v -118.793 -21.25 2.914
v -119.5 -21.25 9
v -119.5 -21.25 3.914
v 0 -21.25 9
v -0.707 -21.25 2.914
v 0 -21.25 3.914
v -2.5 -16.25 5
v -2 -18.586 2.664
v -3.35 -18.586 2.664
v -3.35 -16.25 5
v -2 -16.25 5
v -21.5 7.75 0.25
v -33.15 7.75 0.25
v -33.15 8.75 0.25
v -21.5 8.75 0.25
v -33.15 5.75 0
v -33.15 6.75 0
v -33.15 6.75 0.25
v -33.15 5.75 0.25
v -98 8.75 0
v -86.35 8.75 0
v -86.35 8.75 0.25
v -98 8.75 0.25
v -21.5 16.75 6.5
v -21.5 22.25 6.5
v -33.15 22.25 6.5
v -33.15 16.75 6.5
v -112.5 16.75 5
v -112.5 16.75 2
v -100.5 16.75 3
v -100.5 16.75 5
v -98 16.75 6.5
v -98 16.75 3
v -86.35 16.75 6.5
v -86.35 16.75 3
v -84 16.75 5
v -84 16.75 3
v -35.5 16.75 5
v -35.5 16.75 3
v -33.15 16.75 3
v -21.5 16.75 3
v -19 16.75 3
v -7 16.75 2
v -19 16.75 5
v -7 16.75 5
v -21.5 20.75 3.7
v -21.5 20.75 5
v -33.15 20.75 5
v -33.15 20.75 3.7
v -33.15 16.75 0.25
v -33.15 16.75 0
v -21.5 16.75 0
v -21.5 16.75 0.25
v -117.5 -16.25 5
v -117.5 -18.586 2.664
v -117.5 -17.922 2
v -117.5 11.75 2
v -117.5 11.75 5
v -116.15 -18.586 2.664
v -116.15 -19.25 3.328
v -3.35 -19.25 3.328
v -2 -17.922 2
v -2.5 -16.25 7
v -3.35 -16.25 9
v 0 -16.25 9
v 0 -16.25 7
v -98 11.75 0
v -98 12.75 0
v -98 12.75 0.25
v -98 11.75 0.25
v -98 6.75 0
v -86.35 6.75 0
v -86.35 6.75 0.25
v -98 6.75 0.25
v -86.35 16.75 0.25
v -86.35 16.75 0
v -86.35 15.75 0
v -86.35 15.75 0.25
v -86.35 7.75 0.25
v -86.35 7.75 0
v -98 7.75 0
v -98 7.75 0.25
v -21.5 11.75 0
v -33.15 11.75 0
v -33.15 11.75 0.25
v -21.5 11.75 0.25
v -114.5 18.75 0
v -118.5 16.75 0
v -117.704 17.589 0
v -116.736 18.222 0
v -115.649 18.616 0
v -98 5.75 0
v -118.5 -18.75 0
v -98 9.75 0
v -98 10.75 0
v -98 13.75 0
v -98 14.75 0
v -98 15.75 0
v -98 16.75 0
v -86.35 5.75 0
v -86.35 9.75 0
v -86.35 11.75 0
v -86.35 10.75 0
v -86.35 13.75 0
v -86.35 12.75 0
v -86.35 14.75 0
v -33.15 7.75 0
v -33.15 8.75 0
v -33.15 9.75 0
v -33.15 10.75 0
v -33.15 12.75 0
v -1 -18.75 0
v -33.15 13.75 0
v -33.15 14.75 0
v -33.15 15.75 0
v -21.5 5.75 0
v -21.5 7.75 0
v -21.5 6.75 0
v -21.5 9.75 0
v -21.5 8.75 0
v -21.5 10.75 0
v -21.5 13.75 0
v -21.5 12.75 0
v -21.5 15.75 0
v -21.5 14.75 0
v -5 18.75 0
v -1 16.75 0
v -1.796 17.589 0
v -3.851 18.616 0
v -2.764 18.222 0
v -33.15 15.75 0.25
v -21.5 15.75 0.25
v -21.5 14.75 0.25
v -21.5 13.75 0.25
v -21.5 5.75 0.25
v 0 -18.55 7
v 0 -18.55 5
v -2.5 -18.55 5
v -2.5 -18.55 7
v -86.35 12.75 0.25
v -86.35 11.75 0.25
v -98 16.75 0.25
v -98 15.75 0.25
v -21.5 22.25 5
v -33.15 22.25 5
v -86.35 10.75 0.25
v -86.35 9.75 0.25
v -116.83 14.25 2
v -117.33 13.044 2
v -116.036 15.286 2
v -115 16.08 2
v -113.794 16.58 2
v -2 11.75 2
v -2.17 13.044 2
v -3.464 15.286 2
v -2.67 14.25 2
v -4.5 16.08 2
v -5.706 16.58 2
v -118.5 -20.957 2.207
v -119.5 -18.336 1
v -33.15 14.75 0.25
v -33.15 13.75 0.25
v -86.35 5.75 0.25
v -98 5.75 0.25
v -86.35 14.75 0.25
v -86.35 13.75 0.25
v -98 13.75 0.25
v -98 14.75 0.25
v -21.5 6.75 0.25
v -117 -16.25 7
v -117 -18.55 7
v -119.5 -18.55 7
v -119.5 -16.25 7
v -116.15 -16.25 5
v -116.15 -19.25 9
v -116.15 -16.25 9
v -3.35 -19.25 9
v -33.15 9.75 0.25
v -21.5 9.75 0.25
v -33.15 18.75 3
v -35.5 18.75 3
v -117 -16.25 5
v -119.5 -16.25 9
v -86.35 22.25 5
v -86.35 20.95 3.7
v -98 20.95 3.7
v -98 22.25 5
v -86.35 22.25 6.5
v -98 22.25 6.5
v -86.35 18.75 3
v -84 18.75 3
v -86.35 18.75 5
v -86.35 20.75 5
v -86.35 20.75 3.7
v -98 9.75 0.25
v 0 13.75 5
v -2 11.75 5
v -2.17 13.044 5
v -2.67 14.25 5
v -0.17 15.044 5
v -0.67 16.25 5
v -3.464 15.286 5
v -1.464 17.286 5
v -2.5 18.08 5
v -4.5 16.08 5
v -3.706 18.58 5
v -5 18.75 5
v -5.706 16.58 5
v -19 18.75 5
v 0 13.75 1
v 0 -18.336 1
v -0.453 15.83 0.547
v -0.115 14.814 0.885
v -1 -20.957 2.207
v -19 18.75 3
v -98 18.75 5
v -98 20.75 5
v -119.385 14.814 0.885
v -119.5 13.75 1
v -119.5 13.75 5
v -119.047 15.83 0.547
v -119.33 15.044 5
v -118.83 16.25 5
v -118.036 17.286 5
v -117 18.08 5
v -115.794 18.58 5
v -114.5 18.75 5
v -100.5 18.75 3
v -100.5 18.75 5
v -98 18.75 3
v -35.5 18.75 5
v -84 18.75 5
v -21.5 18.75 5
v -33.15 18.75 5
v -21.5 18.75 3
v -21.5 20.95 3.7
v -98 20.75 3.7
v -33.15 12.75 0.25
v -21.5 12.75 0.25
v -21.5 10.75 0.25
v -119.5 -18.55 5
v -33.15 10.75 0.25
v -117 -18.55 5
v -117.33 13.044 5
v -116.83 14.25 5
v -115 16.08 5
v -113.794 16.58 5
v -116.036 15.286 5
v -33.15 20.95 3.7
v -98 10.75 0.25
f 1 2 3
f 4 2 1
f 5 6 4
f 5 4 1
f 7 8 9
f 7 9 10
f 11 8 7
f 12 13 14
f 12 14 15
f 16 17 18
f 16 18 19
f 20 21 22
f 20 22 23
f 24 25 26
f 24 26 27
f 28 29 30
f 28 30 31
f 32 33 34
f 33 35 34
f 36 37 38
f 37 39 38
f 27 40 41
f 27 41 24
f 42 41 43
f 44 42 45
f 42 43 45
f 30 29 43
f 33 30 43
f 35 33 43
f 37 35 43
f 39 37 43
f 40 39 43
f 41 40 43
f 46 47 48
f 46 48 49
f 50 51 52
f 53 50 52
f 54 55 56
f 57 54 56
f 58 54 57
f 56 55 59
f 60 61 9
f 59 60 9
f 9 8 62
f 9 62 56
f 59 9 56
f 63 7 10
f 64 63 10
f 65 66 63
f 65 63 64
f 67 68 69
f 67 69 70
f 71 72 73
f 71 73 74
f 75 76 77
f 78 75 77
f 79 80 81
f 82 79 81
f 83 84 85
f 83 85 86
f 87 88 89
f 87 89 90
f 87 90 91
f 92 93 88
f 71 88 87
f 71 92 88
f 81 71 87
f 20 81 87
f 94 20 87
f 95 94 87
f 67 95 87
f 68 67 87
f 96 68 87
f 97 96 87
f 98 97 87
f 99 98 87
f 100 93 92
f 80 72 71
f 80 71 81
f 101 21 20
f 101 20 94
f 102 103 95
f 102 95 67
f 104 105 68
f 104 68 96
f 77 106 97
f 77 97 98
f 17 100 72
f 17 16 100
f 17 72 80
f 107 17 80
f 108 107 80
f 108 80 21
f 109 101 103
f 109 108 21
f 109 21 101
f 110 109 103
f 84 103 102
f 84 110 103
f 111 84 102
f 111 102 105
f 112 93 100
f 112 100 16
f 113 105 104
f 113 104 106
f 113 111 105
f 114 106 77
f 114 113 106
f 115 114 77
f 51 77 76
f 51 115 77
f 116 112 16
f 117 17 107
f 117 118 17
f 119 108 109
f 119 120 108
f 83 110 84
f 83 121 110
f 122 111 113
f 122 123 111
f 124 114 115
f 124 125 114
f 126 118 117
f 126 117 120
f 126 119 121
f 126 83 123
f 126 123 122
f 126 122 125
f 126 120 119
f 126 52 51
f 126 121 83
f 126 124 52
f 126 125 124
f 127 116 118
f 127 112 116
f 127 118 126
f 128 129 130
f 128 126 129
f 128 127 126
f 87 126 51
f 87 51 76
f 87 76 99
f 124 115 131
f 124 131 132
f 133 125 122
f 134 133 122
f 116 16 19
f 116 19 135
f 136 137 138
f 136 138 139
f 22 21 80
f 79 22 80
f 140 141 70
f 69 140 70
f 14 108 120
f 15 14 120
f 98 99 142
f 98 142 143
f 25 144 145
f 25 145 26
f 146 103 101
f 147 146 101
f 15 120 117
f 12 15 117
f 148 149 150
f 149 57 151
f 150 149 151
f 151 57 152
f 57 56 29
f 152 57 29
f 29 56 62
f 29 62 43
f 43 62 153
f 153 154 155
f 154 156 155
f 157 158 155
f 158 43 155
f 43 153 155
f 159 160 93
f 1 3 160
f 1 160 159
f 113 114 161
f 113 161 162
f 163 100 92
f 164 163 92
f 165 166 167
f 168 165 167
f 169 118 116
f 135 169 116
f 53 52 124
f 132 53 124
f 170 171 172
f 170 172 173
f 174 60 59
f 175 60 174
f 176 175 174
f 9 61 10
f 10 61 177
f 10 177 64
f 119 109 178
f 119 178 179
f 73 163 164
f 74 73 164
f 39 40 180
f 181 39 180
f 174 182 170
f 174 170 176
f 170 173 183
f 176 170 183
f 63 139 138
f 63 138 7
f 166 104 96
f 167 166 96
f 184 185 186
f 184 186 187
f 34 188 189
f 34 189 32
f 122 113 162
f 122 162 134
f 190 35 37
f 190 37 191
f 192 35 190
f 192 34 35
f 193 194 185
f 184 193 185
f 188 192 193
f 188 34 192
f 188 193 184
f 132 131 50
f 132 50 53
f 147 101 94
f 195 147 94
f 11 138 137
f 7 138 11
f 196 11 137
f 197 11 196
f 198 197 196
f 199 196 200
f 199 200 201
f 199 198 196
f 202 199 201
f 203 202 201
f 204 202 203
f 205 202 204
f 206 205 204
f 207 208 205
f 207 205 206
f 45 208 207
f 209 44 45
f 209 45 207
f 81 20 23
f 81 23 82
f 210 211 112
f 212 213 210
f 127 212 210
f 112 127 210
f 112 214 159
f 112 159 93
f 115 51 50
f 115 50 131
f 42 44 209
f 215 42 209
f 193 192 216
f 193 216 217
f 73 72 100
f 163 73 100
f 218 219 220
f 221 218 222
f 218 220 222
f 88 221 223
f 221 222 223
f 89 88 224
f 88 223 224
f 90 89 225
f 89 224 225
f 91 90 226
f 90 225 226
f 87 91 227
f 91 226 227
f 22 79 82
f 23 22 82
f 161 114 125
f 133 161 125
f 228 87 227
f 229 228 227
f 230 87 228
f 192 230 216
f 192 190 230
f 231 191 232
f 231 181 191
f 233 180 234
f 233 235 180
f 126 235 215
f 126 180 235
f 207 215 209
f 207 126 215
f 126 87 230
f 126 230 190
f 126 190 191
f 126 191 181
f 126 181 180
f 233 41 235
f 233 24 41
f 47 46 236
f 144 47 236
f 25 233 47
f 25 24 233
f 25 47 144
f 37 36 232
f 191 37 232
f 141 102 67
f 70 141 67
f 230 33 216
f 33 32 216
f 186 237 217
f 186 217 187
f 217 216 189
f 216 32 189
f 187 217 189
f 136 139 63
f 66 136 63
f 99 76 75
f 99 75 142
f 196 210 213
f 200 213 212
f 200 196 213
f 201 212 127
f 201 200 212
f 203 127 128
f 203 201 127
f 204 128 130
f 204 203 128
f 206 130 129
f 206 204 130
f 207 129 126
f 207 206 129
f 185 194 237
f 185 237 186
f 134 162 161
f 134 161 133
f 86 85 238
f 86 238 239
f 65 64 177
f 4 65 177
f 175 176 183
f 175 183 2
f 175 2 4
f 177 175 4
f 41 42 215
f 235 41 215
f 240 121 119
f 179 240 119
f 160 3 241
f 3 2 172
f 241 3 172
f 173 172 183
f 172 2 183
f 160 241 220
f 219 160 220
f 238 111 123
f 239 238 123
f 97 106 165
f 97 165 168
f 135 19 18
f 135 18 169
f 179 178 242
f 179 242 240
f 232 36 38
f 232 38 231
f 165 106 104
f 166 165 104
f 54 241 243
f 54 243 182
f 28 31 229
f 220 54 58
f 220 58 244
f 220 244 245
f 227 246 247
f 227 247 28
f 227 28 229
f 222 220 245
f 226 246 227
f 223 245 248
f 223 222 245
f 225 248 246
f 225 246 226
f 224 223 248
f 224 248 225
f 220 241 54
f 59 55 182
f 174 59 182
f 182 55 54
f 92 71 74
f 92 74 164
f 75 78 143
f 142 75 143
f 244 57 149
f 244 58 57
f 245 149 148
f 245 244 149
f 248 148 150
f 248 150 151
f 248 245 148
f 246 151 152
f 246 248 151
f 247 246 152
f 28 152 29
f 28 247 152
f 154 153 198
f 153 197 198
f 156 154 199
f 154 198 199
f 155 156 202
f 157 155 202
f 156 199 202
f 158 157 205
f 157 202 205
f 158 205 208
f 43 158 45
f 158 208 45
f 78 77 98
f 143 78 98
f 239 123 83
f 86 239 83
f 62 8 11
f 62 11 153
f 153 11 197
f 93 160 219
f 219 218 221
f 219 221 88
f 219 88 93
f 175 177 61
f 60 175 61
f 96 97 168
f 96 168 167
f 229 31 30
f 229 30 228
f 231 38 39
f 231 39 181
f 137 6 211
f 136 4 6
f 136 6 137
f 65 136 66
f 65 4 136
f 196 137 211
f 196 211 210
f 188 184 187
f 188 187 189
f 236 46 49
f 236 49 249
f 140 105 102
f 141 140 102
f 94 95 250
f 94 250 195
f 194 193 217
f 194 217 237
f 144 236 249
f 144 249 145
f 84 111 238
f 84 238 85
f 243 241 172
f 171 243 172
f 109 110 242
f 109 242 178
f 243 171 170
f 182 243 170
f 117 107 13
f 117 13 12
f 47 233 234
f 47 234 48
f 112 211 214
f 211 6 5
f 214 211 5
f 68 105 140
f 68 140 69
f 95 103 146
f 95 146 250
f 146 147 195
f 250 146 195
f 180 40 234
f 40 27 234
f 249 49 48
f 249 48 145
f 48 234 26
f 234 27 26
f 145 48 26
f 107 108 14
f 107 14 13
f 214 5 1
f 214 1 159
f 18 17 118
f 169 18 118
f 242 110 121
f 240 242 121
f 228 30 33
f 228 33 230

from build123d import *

# Parameters (mm, degrees)
F0_W         = 2.3
F0_H         = 2
F0_W_2       = 2
F1_DEPTH     = 119.5
F2_T         = -2
F3_DEPTH     = 3.35
F4_DEPTH     = 2.5
F5_START     = -19
F5_DEPTH     = 16.5
F6_START     = -21.5
F6_DEPTH     = 11.65
F8_W         = 11.65
F8_H         = 1
F9_DEPTH     = 0.25
F10_T1_DEPTH = 42.6433659759
F10_T3_DEPTH = 8.6788998819
F10_T5_DEPTH = 121.7571417204
F11_R        = 5


# Not quite as in the source:
# - a fillet or chamfer that OpenCascade refuses, or shapes differently, is made with other operations: its cross-section is extruded or revolved along the edge and cut away or added
# - a pattern or mirror of a feature is missing from the dataset's text; its kind, count and spacing are read off the source's solid


with BuildPart() as f1:
    # F0 (on Right) → F1 (new body)
    with BuildSketch(Plane.YZ):
        with Locations((-17.4, 6)):
            Rectangle(F0_W, F0_H)
        Polygon((-21.25, 2.5), (-20, 1.25), (-16.25, 5), (-18.55, 5), (-18.55, 7), (-16.25, 7), (-16.25, 9), (-21.25, 9), align=None)
        Polygon((-18.75, 0), (18.75, 0), (18.75, 3), (16.75, 3), (16.75, 5), (-16.25, 5), (-20, 1.25), align=None)
        with Locations((17.75, 4)):
            Rectangle(F0_W_2, F0_H)
    extrude(amount=-F1_DEPTH)

    # F2
    f2_openings = [f1.faces().sort_by_distance(p)[0] for p in [
        (-59.75, 1.25, 5),
        (-59.75, -16.25, 7),
        (-59.75, -18.75, 9),
    ]]
    offset(amount=F2_T, openings=f2_openings)

    # F0 (on Right) → F3 (join)
    with BuildSketch(Plane.YZ):
        with Locations((-17.4, 6)):
            Rectangle(F0_W, F0_H)
        Polygon((-21.25, 2.5), (-20, 1.25), (-16.25, 5), (-18.55, 5), (-18.55, 7), (-16.25, 7), (-16.25, 9), (-21.25, 9), align=None)
    f3 = extrude(amount=-F3_DEPTH)

    # F3_copies: F3 across plane
    add(f3.mirror(Plane(origin=(-59.75, 0, 0), x_dir=(0, 0, -1), z_dir=(-1, 0, 0))))

    # F0 (on Right) → F4 (cut)
    with BuildSketch(Plane.YZ):
        with Locations((-17.4, 6)):
            Rectangle(F0_W, F0_H)
    f4 = extrude(amount=-F4_DEPTH, mode=Mode.SUBTRACT)

    # F4_copies: F4 across plane
    add(f4.mirror(Plane(origin=(-59.75, 0, 0), x_dir=(0, 0, -1), z_dir=(-1, 0, 0))), mode=Mode.SUBTRACT)

    # F0 (on Right) → F5 (cut)
    with BuildSketch(Plane.YZ.offset(F5_START)):
        with Locations((17.75, 4)):
            Rectangle(F0_W_2, F0_H)
    f5 = extrude(amount=-F5_DEPTH, mode=Mode.SUBTRACT)

    # F5_copies: F5 across plane
    add(f5.mirror(Plane(origin=(-59.75, 0, 0), x_dir=(0, 0, -1), z_dir=(-1, 0, 0))), mode=Mode.SUBTRACT)

    # F0 (on Right) → F6 (join)
    with BuildSketch(Plane.YZ.offset(F6_START)):
        with Locations((17.75, 4)):
            Rectangle(F0_W_2, F0_H)
        Polygon((16.75, 5), (18.75, 5), (20.75, 5), (20.75, 3.7), (20.95, 3.7), (22.25, 5), (22.25, 6.5), (16.75, 6.5), align=None)
    f6 = extrude(amount=-F6_DEPTH)

    # F6_copies: F6 across plane
    add(f6.mirror(Plane(origin=(-59.75, 0, 0), x_dir=(0, 0, -1), z_dir=(-1, 0, 0))))

    # F8 (on face) → F9 (cut)
    with BuildSketch(Plane(origin=(0, 0, 0), x_dir=(1, 0, 0), z_dir=(0, 0, -1))):
        with Locations((-27.325, -16.25)):
            Rectangle(F8_W, F8_H)
        with Locations((-27.325, -14.25)):
            Rectangle(F8_W, F8_H)
        with Locations((-27.325, -12.25)):
            Rectangle(F8_W, F8_H)
        with Locations((-27.325, -10.25)):
            Rectangle(F8_W, F8_H)
        with Locations((-27.325, -8.25)):
            Rectangle(F8_W, F8_H)
        with Locations((-27.325, -6.25)):
            Rectangle(F8_W, F8_H)
    f9 = extrude(amount=-F9_DEPTH, mode=Mode.SUBTRACT)

    # F9_copies: F9 across plane
    add(f9.mirror(Plane(origin=(-59.75, 0, 0), x_dir=(0, 0, -1), z_dir=(-1, 0, 0))), mode=Mode.SUBTRACT)

    # F10: chamfer of 1 on 5 edges, made by hand

    # F10_s2 → F10_t1 (cut)
    with BuildSketch(Plane.XZ.offset(-21.321682988)):
        Polygon((0, 1), (-1, 0), (0, 0), align=None)
        Polygon((-119.5, 1), (-118.5, 0), (-119.5, 0), align=None)
    extrude(amount=F10_T1_DEPTH, mode=Mode.SUBTRACT)

    # F10_s4 → F10_t3 (cut)
    with BuildSketch(Plane(origin=(0, -13.6934544799, 13.6934544799), x_dir=(1, 0, 0), z_dir=(0, 0.7071067812, -0.7071067812))):
        Polygon((0, 12.2582521472), (-1, 13.2582521472), (0, 13.2582521472), align=None)
        Polygon((-119.5, 12.2582521472), (-118.5, 13.2582521472), (-119.5, 13.2582521472), align=None)
    extrude(amount=F10_T3_DEPTH, mode=Mode.SUBTRACT)

    # F10_s6 → F10_t5 (cut)
    with BuildSketch(Plane.YZ.offset(-120.6285708602)):
        Polygon((-21.25, 2.9142135624), (-20.9571067812, 2.2071067812), (-21.25, 2.5), align=None)
    extrude(amount=F10_T5_DEPTH, mode=Mode.SUBTRACT)

    # F11
    f11_edges = [f1.edges().sort_by_distance(p)[0] for p in [
        (0, 18.75, 3),
        (-119.5, 18.75, 3),
        (-2, 16.75, 3.5),
        (-117.5, 16.75, 3.5),
    ]]
    fillet(f11_edges, radius=F11_R)


solid = f1.part
